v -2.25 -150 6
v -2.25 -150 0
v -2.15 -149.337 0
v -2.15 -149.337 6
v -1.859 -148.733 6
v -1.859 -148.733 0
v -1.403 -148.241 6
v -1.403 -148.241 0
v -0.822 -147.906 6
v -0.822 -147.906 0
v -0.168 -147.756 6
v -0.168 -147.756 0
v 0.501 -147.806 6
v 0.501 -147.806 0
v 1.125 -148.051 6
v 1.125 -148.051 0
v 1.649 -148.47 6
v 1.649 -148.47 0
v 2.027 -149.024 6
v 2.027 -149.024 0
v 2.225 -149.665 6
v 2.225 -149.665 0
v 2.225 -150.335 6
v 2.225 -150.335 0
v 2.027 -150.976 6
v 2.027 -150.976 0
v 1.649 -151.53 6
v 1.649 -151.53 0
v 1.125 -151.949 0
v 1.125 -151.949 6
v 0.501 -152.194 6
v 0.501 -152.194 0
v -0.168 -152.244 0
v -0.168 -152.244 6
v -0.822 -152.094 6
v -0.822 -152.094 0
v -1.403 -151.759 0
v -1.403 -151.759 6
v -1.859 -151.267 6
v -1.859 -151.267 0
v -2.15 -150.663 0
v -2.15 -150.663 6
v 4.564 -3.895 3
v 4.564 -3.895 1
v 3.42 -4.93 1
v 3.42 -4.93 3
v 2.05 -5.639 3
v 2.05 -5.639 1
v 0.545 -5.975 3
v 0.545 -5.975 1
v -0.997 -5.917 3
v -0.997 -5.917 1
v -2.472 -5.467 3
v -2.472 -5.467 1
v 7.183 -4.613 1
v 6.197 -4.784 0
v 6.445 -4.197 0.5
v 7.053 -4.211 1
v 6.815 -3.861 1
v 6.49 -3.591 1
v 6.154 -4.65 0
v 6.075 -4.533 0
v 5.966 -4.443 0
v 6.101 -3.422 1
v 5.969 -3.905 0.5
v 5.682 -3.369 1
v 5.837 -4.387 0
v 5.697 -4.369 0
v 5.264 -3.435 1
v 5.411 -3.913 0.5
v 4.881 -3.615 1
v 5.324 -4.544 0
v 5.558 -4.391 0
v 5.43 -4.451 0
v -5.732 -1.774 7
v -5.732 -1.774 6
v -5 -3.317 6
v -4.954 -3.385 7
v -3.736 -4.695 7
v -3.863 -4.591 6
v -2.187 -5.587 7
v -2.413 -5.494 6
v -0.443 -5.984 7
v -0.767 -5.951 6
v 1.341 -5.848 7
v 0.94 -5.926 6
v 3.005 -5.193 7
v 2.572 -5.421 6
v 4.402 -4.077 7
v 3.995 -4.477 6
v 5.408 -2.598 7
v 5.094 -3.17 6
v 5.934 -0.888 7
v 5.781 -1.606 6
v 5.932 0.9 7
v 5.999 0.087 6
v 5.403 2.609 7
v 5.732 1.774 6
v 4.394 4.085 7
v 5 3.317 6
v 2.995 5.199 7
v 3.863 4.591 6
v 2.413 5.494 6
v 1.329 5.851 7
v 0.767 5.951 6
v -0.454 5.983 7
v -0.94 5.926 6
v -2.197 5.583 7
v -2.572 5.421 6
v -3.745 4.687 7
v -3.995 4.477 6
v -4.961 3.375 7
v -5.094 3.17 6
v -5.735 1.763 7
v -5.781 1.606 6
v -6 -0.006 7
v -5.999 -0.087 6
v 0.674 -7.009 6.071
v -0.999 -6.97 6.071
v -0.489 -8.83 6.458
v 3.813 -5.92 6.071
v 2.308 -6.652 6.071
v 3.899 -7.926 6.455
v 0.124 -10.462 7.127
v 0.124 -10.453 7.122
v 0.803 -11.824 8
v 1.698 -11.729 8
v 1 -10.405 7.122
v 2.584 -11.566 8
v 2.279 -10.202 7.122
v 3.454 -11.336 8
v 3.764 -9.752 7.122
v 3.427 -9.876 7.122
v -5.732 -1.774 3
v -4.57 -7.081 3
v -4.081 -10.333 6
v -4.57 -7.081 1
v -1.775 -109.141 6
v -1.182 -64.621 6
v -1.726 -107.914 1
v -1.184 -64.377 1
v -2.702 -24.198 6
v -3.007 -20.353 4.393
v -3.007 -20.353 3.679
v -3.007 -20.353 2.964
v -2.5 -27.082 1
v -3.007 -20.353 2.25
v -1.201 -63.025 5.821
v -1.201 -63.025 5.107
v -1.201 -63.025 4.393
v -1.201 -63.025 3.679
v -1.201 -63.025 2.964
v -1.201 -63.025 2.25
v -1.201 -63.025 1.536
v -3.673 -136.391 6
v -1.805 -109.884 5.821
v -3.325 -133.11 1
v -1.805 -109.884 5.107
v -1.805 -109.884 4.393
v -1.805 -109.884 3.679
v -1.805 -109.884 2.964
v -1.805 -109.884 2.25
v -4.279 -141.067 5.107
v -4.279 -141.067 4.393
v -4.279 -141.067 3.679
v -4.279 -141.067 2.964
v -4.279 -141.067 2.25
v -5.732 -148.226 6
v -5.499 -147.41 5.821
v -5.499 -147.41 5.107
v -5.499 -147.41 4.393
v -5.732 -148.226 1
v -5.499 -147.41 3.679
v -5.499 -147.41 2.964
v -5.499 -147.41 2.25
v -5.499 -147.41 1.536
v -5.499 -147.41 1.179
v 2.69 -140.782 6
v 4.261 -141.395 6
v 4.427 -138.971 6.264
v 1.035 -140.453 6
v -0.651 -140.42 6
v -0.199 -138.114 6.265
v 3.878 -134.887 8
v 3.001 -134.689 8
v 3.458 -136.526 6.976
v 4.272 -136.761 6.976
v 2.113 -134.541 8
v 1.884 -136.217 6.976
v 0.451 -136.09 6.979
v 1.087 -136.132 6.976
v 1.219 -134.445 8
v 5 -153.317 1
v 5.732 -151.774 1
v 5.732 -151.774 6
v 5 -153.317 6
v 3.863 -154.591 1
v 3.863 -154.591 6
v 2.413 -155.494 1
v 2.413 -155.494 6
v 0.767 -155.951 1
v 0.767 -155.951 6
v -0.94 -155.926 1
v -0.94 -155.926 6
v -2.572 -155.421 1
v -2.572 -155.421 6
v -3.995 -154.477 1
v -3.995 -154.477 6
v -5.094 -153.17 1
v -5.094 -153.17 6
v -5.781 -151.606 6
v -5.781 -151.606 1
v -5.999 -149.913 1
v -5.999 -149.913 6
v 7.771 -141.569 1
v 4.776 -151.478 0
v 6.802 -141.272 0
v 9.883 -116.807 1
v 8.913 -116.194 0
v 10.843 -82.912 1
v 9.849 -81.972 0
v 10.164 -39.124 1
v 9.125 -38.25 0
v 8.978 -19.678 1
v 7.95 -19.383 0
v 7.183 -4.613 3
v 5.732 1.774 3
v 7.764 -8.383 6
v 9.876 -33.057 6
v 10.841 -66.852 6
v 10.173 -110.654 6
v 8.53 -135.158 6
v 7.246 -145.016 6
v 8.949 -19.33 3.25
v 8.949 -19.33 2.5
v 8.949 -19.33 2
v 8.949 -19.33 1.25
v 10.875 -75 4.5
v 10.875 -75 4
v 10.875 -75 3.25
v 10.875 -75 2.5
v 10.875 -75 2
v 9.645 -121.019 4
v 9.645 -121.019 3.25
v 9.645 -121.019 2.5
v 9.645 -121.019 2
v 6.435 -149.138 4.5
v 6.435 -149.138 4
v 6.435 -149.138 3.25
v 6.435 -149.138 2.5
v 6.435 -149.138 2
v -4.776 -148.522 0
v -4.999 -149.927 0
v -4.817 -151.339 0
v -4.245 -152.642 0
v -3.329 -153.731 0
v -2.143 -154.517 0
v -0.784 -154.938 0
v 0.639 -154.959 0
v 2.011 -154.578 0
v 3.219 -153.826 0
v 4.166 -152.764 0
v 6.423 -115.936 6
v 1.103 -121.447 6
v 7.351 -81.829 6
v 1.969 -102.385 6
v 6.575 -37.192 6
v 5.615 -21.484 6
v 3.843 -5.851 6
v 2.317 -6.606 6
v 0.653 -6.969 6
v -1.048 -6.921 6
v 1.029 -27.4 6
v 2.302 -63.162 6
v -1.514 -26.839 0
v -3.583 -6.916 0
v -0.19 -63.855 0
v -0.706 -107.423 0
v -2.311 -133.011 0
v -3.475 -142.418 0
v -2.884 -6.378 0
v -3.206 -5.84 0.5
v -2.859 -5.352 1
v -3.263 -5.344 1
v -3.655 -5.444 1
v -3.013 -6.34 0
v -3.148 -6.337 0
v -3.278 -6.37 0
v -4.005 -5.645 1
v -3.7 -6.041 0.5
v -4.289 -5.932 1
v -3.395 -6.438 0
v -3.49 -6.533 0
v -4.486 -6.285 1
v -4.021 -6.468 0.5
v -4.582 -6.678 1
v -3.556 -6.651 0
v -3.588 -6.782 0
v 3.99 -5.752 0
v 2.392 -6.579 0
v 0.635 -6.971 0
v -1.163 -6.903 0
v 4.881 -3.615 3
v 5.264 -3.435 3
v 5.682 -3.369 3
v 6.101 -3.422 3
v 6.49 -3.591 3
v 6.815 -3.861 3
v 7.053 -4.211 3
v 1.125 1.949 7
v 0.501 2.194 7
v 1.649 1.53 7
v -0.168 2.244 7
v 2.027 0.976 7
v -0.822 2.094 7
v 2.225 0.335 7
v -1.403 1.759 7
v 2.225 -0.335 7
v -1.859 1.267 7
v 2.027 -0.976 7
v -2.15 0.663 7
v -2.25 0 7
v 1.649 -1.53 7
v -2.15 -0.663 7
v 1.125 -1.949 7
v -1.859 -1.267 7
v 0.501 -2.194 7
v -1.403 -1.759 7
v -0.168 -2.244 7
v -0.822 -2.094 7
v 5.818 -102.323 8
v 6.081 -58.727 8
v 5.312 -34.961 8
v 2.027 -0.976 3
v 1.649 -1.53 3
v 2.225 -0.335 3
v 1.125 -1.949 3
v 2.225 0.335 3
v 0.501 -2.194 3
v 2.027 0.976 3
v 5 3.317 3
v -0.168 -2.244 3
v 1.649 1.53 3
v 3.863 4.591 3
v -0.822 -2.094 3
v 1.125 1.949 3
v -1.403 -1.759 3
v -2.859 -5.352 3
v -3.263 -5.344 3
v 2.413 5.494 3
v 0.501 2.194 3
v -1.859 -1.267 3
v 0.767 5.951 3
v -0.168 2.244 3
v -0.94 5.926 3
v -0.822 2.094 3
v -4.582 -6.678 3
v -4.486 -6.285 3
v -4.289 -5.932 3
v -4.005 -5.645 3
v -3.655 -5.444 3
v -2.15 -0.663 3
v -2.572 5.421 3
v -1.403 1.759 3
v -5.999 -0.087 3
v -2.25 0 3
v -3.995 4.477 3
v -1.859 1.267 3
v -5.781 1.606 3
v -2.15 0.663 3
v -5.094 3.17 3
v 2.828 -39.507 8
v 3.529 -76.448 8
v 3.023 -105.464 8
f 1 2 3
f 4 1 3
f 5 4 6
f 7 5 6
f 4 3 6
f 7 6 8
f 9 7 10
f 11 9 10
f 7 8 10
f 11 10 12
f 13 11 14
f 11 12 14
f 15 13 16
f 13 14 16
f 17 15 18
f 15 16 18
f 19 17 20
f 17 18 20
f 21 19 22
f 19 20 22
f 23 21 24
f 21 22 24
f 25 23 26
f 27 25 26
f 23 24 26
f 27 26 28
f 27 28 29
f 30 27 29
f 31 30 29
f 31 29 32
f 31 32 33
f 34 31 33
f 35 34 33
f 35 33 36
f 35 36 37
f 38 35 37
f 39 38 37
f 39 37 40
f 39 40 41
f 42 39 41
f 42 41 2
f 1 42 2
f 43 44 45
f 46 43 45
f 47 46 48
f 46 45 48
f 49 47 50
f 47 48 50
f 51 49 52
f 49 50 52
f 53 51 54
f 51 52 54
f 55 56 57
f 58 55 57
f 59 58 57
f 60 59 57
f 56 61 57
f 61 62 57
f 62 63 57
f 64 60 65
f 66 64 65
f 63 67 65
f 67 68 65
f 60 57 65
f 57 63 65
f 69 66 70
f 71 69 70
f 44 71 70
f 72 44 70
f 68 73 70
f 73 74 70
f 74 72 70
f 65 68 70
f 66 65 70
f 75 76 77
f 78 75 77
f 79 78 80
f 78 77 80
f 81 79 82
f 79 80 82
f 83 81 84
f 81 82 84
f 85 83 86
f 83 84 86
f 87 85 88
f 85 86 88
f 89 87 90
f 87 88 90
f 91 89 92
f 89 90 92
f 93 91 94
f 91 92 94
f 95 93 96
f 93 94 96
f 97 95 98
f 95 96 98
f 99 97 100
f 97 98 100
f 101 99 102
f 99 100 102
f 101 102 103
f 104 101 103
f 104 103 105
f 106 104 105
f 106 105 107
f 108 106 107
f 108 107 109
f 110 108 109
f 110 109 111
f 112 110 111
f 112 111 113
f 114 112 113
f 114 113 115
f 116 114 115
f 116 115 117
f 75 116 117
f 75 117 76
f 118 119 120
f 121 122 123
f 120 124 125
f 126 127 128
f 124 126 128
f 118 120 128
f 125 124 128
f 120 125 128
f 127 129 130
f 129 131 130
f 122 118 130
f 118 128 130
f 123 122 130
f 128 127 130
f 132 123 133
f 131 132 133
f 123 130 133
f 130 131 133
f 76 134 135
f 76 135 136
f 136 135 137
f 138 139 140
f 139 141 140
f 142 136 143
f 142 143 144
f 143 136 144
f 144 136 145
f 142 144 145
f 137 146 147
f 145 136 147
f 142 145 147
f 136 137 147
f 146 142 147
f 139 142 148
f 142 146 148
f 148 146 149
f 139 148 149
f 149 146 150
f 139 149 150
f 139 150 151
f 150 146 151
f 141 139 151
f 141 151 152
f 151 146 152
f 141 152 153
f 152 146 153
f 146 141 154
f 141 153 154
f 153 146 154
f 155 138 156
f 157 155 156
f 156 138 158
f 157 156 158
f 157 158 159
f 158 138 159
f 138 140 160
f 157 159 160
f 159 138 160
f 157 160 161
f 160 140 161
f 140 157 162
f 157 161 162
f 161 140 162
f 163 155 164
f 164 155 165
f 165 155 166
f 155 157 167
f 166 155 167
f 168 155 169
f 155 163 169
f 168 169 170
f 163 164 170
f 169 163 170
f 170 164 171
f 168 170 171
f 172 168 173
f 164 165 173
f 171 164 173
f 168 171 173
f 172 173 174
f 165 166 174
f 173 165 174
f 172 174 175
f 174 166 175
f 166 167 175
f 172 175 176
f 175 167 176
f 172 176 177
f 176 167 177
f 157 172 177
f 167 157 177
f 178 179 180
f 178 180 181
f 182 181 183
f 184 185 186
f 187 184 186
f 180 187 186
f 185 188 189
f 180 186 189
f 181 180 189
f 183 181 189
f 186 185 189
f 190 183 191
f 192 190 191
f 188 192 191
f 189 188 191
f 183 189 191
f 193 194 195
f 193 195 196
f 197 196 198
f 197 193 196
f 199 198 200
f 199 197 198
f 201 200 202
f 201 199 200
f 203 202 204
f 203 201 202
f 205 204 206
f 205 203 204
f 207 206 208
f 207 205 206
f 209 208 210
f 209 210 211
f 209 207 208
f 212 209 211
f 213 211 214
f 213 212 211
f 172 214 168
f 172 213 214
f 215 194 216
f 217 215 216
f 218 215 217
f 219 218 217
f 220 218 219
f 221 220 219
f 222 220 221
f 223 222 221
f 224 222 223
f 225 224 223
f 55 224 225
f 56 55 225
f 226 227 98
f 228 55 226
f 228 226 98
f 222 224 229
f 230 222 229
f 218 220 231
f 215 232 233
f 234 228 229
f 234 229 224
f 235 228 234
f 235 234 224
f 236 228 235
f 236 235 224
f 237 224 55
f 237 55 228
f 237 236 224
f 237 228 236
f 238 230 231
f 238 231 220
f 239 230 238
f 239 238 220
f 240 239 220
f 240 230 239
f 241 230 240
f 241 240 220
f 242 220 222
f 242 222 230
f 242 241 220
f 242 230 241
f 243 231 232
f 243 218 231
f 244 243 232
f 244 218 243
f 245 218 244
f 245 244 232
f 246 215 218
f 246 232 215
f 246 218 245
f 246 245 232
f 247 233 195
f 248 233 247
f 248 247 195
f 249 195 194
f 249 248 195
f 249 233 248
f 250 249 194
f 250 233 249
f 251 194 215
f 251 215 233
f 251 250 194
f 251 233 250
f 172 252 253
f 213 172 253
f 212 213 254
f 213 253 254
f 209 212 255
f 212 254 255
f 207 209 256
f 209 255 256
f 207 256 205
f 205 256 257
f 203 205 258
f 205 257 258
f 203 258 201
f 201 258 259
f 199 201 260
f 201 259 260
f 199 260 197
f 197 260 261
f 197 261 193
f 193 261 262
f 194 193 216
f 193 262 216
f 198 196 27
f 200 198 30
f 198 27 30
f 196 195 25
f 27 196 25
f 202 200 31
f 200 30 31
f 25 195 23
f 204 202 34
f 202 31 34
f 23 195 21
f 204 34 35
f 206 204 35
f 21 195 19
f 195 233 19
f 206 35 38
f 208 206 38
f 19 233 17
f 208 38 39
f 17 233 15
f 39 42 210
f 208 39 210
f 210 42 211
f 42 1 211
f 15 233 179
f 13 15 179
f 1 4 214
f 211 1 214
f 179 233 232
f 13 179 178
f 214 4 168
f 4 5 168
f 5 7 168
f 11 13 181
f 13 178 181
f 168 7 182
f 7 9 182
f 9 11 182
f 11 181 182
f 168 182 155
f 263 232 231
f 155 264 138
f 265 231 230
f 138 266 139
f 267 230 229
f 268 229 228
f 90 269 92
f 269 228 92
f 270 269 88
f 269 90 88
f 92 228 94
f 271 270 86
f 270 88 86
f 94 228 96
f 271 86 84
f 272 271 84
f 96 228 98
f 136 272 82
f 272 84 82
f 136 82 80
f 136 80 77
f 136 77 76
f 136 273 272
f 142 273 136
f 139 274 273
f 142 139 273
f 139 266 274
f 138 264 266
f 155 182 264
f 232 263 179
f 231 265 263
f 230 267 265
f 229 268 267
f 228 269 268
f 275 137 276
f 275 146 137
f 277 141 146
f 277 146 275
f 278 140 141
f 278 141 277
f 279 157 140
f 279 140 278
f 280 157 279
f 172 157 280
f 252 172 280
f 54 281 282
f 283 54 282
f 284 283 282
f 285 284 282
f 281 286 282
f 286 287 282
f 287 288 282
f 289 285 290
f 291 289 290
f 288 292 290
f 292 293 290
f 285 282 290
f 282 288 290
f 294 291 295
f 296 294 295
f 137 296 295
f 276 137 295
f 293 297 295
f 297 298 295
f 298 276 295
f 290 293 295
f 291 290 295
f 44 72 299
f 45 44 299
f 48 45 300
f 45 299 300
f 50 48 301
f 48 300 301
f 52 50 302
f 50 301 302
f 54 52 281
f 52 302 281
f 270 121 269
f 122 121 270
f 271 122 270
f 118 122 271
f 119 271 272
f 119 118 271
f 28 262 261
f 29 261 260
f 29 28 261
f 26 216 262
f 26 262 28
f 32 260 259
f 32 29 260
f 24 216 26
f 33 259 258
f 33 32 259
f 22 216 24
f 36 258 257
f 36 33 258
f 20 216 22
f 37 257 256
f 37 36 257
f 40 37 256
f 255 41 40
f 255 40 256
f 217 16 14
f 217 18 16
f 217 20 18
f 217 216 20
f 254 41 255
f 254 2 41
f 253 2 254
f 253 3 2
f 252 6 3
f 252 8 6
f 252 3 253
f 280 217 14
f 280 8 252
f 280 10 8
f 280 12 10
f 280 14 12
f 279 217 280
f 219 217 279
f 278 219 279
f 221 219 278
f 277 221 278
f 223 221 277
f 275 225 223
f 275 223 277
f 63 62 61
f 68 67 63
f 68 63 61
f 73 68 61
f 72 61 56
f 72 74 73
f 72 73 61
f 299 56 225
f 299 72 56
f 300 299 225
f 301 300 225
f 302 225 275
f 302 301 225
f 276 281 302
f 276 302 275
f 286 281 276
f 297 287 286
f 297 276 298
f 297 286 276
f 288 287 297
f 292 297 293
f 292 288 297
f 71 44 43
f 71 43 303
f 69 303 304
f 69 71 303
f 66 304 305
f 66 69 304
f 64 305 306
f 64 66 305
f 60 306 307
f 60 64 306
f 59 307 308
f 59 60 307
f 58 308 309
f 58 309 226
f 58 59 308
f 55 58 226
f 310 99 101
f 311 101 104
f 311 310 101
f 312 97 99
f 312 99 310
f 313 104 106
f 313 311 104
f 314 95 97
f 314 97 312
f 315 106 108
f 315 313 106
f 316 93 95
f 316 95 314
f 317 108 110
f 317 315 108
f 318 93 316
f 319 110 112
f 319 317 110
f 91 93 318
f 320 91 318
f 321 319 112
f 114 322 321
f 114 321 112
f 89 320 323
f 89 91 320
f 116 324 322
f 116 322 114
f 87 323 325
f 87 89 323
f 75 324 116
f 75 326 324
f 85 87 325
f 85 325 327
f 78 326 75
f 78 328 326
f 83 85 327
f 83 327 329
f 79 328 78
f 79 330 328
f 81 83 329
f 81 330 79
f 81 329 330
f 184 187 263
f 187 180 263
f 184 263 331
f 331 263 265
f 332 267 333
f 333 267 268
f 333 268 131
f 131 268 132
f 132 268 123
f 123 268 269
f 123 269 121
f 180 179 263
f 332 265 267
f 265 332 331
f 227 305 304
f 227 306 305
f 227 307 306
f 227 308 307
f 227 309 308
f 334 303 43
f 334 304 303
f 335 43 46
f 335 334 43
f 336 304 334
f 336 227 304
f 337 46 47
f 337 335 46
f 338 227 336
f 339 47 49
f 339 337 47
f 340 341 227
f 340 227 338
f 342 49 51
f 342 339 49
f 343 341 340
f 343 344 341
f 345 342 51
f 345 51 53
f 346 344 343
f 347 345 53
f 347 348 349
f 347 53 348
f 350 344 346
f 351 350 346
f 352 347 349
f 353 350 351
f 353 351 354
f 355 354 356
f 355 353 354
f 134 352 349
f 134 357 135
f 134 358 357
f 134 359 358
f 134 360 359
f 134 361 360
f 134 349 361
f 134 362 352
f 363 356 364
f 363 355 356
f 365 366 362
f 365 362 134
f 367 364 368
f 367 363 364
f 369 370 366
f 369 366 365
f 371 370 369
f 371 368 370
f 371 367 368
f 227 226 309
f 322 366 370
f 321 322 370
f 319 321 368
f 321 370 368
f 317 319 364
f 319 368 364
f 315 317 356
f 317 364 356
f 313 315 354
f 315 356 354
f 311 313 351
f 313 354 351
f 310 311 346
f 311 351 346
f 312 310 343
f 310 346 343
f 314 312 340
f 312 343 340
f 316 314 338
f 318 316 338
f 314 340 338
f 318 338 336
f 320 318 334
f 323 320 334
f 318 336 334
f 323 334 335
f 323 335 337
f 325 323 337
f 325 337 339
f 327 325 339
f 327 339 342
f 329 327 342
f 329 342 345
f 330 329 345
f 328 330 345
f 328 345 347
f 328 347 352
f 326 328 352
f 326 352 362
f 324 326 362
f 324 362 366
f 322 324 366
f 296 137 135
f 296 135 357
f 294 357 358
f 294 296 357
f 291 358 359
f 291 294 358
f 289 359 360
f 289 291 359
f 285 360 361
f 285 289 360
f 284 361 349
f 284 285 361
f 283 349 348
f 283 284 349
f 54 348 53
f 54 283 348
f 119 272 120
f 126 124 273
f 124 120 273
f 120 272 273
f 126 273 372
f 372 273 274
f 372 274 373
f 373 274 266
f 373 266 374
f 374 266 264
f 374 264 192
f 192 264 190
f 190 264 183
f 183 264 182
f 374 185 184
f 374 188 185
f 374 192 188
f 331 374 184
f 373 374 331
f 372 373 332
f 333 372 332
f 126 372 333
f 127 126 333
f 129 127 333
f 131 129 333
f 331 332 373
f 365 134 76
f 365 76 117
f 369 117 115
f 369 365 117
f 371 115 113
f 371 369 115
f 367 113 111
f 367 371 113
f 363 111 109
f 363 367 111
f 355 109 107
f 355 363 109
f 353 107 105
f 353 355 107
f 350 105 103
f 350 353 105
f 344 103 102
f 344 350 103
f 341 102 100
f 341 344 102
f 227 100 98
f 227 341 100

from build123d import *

# Parameters (mm, degrees)
BOSS_EXTRUDE1_DEPTH  = 6
BOSS_EXTRUDE2_DEPTH  = 2
BOSS_EXTRUDE2_TAPER  = 30
SKETCH6_R            = 6
BOSS_EXTRUDE3_DEPTH  = 1
SKETCH7_R            = 6
CUT_EXTRUDE1_DEPTH   = 3
FILLET1_START        = -1
FILLET1_DEPTH        = 4
CHAMFER1_SIZE        = 1
M4_CLEARANCE_HOLE1_D = 4.5


with BuildPart() as part:
    # Sketch1 → Boss-Extrude1 (new body)
    with BuildSketch(Plane.XY):
        with BuildLine():
            ThreePointArc((-5.731715344, -1.774102368), (-1.774102368, 5.731715344), (5.731715344, 1.774102368))
            add(Edge.make_bspline(
                [(5.731715344, 1.774102368), (5.862890335, 1.350306246), (6.10195439, 0.511836894), (6.5513215, -1.302172264), (7.055062132, -3.775725238), (7.600837363, -7.119895561), (8.261344969, -12.065805628), (8.9758633, -19.127681627), (9.671419516, -28.81644754), (10.210024516, -39.49120604), (10.721813898, -54.718080156), (10.977124068, -75), (10.721813898, -95.281919844), (10.210024516, -110.50879396), (9.671419516, -121.18355246), (8.9758633, -130.872318373), (8.261344969, -137.934194372), (7.600837363, -142.880104439), (7.055062132, -146.224274762), (6.5513215, -148.697827736), (6.10195439, -150.511836894), (5.862890335, -151.350306246), (5.731715344, -151.774102368)],
                knots=[0, 0, 0, 0, 0.015625, 0.03125, 0.0625, 0.09375, 0.125, 0.1875, 0.25, 0.3125, 0.375, 0.5, 0.625, 0.6875, 0.75, 0.8125, 0.875, 0.90625, 0.9375, 0.96875, 0.984375, 1, 1, 1, 1], degree=3))
            ThreePointArc((5.731715344, -151.774102368), (-1.774102368, -155.731715344), (-5.731715344, -148.225897632))
            add(Edge.make_bspline(
                [(-5.731715344, -1.774102368), (-5.692087495, -1.902130803), (-5.618775496, -2.148725819), (-5.458728189, -2.727966614), (-5.255155063, -3.54817606), (-5.006643591, -4.688807627), (-4.677115643, -6.39564749), (-4.27454567, -8.85601244), (-3.817957958, -12.269624912), (-3.392734432, -16.09709888), (-2.871156001, -21.69677536), (-2.308115125, -29.531273979), (-1.780341203, -39.985350621), (-1.402466695, -51.223362083), (-1.175470707, -62.981825406), (-1.099764647, -75), (-1.175470707, -87.018174594), (-1.402466695, -98.776637917), (-1.780341203, -110.014649379), (-2.308115125, -120.468726021), (-2.871156001, -128.30322464), (-3.392734432, -133.90290112), (-3.817957958, -137.730375088), (-4.27454567, -141.14398756), (-4.677115643, -143.60435251), (-5.006643591, -145.311192373), (-5.255155063, -146.45182394), (-5.458728189, -147.272033386), (-5.618775496, -147.851274181), (-5.692087495, -148.097869197), (-5.731715344, -148.225897632)],
                knots=[0, 0, 0, 0, 0.0078125, 0.015625, 0.03125, 0.046875, 0.0625, 0.09375, 0.125, 0.15625, 0.1875, 0.25, 0.3125, 0.375, 0.4375, 0.5, 0.5625, 0.625, 0.6875, 0.75, 0.8125, 0.84375, 0.875, 0.90625, 0.9375, 0.953125, 0.96875, 0.984375, 0.9921875, 1, 1, 1, 1], degree=3))
        make_face()
    extrude(amount=BOSS_EXTRUDE1_DEPTH)

    # Sketch2 → Boss-Extrude2 (add)
    with BuildSketch(Plane.XY.offset(6)):
        with BuildLine():
            add(Edge.make_bspline(
                [(3.842779218, -144.149098541), (3.99518889, -143.228609095), (4.133577932, -142.306808915), (4.482341024, -139.816291581), (4.674300588, -138.24585293), (5.022834622, -135.101667614), (5.179034802, -133.527885959), (5.608568883, -128.802888823), (5.843693204, -125.648101279), (6.249577099, -119.332508984), (6.419662658, -116.171641222), (6.857535334, -106.68227104), (7.05432563, -100.34499664), (7.313633365, -87.672679841), (7.436364195, -75.000225736), (7.313637964, -62.327524864), (7.05431874, -49.65468667), (6.857549017, -43.318319211), (6.419745963, -33.830017305), (6.249687473, -30.669449522), (5.843863318, -24.354304808), (5.608771942, -21.1996664), (5.179285888, -16.474715495), (5.023101498, -14.900919175), (4.67459471, -11.756621418), (4.482646895, -10.186085829), (4.133804085, -7.694692501), (3.995316322, -6.772156482), (3.842779302, -5.850901403)],
                knots=[0.044109896, 0.044109896, 0.044109896, 0.044109896, 0.0625, 0.0625, 0.09375, 0.09375, 0.125, 0.125, 0.1875, 0.1875, 0.25, 0.25, 0.375, 0.375, 0.5, 0.625, 0.625, 0.75, 0.75, 0.8125, 0.8125, 0.875, 0.875, 0.90625, 0.90625, 0.9375, 0.9375, 0.955902495, 0.955902495, 0.955902495, 0.955902495], degree=3))
            ThreePointArc((3.842779302, -5.850901403), (1.496097545, -6.838252126), (-1.048489728, -6.921030941))
            add(Edge.make_bspline(
                [(-1.048489728, -6.921030941), (-0.887726028, -7.908676873), (-0.743269436, -8.898495118), (-0.400727329, -11.426505037), (-0.218072452, -12.966752267), (0.114129955, -16.051657047), (0.263395019, -17.596352224), (0.674511995, -22.235323757), (0.900378843, -25.335536499), (1.290535741, -31.537230608), (1.454172696, -34.639030666), (1.875705513, -43.946533714), (2.065405192, -50.154303756), (2.315616461, -62.573759578), (2.374993429, -68.785688578), (2.37500657, -81.21228644), (2.315647979, -87.424382498), (2.065406806, -99.845909639), (1.875647227, -106.055756994), (1.453897372, -115.3665461), (1.290239744, -118.467676771), (0.900441737, -124.663261276), (0.675011926, -127.757791041), (0.264495235, -132.3918521), (0.115436706, -133.935233344), (-0.216369082, -137.018395892), (-0.398831003, -138.558207687), (-0.741756199, -141.091163775), (-0.886846381, -142.085950818), (-1.048489537, -143.07896903)],
                knots=[0.042345585, 0.042345585, 0.042345585, 0.042345585, 0.0625, 0.0625, 0.09375, 0.09375, 0.125, 0.125, 0.1875, 0.1875, 0.25, 0.25, 0.375, 0.375, 0.5, 0.5, 0.625, 0.625, 0.75, 0.75, 0.8125, 0.8125, 0.875, 0.875, 0.90625, 0.90625, 0.9375, 0.9375, 0.957747168, 0.957747168, 0.957747168, 0.957747168], degree=3))
            ThreePointArc((-1.048489537, -143.07896903), (1.49609759, -143.161747884), (3.842779218, -144.149098541))
        make_face()
    extrude(amount=BOSS_EXTRUDE2_DEPTH, taper=BOSS_EXTRUDE2_TAPER)

    # Sketch5 → Cut-Revolve1 (revolve, cut)
    with BuildSketch(Plane(origin=(0, 0, 0), x_dir=(0, 0, -1), z_dir=(1, 0, 0))):
        with BuildLine():
            ThreePointArc((-6, -140.397478747), (-6.513167019, -137.235201087), (-8, -134.397478747))
            Line((-8, -134.397478747), (-8, -142.397478747))
            Line((-8, -142.397478747), (-6, -144.149098541))
            Line((-6, -144.149098541), (-6, -140.397478747))
        make_face()
    revolve(axis=Axis((0, -150, 0), (0, 0, 1)), mode=Mode.SUBTRACT)

    # Sketch5<4> → Cut-Revolve2 (revolve, cut)
    with BuildSketch(Plane(origin=(0, 0, 0), x_dir=(0, 0, -1), z_dir=(1, 0, 0))):
        with BuildLine():
            Line((-8, -7.602521037), (-6, -5.850901403))
            ThreePointArc((-6, -5.850901403), (-6.513167019, -9.013179064), (-8, -11.850901403))
            Line((-8, -11.850901403), (-8, -7.602521037))
        make_face()
    revolve(axis=Axis((0, 0, 0), (0, 0, 1)), mode=Mode.SUBTRACT)

    # Sketch6 → Boss-Extrude3 (add)
    with BuildSketch(Plane.XY.offset(6)):
        with Locations(Location((0, 0, 0), (0, 0, 197.19854122))):
            Circle(SKETCH6_R)
    extrude(amount=BOSS_EXTRUDE3_DEPTH)

    # Sketch7 → Cut-Extrude1 (cut)
    with BuildSketch(Plane(origin=(0, 0, 0), x_dir=(-1, 0, 0), z_dir=(0, 0, -1))):
        with Locations(Location((0, 0, 0), (0, 0, 342.80145878))):
            Circle(SKETCH7_R)
    extrude(amount=-CUT_EXTRUDE1_DEPTH, mode=Mode.SUBTRACT)

    # Fillet1: read off the stored shape, not the designer's step
    # Fillet1 outline → Fillet1 (cut)
    with BuildSketch(Plane.XY.offset(FILLET1_START)):
        with BuildLine():
            add(Edge.make_bspline(
                [(-5.731715344, -1.774102368), (-5.692087495, -1.902130803), (-5.618775496, -2.148725819), (-5.458728189, -2.727966614), (-5.255155063, -3.54817606), (-5.006643591, -4.688807627), (-4.777507184, -5.875654311), (-4.632728696, -6.704930928), (-4.56971799, -7.081374578)],
                knots=[0, 0, 0, 0, 0.0078125, 0.015625, 0.03125, 0.046875, 0.0625, 0.074709213, 0.074709213, 0.074709213, 0.074709213], degree=3))
            ThreePointArc((-4.56971799, -7.081374578), (-4.005198612, -5.645063514), (-2.472239677, -5.466994694))
            ThreePointArc((-2.472239677, -5.466994694), (-4.498397818, -3.970442931), (-5.731715344, -1.774102368))
        make_face()
        with BuildLine():
            ThreePointArc((5.731715344, 1.774102368), (5.876589294, -1.210660261), (4.563775855, -3.895118733))
            ThreePointArc((4.563775855, -3.895118733), (6.101473007, -3.422320762), (7.182806929, -4.613440991))
            add(Edge.make_bspline(
                [(5.731715344, 1.774102368), (5.862890335, 1.350306246), (6.10195439, 0.511836894), (6.5513215, -1.302172264), (6.902345222, -3.025828681), (7.137523842, -4.351431198), (7.182806929, -4.613440991)],
                knots=[0, 0, 0, 0, 0.015625, 0.03125, 0.0625, 0.070065175, 0.070065175, 0.070065175, 0.070065175], degree=3))
        make_face()
    extrude(amount=FILLET1_DEPTH, mode=Mode.SUBTRACT)

    # Chamfer1
    chamfer1_edges = [part.edges().sort_by_distance(p)[0] for p in [
        (-1.128874241, -77.718314318, 0),
        (-1.774102368, -155.731715344, 0),
        (10.869440998, -78.27732173, 0),
        (-4.005198612, -5.645063514, 0),
        (1.308177895, -5.855652875, 0),
        (6.101473007, -3.422320762, 0),
    ]]
    chamfer(chamfer1_edges, length=CHAMFER1_SIZE)

    # M4 Clearance Hole1 (through all)
    with Locations(Plane.XY.offset(7)):
        with Locations((0, 0), (0, -150)):
            Hole(M4_CLEARANCE_HOLE1_D / 2)


solid = part.part
